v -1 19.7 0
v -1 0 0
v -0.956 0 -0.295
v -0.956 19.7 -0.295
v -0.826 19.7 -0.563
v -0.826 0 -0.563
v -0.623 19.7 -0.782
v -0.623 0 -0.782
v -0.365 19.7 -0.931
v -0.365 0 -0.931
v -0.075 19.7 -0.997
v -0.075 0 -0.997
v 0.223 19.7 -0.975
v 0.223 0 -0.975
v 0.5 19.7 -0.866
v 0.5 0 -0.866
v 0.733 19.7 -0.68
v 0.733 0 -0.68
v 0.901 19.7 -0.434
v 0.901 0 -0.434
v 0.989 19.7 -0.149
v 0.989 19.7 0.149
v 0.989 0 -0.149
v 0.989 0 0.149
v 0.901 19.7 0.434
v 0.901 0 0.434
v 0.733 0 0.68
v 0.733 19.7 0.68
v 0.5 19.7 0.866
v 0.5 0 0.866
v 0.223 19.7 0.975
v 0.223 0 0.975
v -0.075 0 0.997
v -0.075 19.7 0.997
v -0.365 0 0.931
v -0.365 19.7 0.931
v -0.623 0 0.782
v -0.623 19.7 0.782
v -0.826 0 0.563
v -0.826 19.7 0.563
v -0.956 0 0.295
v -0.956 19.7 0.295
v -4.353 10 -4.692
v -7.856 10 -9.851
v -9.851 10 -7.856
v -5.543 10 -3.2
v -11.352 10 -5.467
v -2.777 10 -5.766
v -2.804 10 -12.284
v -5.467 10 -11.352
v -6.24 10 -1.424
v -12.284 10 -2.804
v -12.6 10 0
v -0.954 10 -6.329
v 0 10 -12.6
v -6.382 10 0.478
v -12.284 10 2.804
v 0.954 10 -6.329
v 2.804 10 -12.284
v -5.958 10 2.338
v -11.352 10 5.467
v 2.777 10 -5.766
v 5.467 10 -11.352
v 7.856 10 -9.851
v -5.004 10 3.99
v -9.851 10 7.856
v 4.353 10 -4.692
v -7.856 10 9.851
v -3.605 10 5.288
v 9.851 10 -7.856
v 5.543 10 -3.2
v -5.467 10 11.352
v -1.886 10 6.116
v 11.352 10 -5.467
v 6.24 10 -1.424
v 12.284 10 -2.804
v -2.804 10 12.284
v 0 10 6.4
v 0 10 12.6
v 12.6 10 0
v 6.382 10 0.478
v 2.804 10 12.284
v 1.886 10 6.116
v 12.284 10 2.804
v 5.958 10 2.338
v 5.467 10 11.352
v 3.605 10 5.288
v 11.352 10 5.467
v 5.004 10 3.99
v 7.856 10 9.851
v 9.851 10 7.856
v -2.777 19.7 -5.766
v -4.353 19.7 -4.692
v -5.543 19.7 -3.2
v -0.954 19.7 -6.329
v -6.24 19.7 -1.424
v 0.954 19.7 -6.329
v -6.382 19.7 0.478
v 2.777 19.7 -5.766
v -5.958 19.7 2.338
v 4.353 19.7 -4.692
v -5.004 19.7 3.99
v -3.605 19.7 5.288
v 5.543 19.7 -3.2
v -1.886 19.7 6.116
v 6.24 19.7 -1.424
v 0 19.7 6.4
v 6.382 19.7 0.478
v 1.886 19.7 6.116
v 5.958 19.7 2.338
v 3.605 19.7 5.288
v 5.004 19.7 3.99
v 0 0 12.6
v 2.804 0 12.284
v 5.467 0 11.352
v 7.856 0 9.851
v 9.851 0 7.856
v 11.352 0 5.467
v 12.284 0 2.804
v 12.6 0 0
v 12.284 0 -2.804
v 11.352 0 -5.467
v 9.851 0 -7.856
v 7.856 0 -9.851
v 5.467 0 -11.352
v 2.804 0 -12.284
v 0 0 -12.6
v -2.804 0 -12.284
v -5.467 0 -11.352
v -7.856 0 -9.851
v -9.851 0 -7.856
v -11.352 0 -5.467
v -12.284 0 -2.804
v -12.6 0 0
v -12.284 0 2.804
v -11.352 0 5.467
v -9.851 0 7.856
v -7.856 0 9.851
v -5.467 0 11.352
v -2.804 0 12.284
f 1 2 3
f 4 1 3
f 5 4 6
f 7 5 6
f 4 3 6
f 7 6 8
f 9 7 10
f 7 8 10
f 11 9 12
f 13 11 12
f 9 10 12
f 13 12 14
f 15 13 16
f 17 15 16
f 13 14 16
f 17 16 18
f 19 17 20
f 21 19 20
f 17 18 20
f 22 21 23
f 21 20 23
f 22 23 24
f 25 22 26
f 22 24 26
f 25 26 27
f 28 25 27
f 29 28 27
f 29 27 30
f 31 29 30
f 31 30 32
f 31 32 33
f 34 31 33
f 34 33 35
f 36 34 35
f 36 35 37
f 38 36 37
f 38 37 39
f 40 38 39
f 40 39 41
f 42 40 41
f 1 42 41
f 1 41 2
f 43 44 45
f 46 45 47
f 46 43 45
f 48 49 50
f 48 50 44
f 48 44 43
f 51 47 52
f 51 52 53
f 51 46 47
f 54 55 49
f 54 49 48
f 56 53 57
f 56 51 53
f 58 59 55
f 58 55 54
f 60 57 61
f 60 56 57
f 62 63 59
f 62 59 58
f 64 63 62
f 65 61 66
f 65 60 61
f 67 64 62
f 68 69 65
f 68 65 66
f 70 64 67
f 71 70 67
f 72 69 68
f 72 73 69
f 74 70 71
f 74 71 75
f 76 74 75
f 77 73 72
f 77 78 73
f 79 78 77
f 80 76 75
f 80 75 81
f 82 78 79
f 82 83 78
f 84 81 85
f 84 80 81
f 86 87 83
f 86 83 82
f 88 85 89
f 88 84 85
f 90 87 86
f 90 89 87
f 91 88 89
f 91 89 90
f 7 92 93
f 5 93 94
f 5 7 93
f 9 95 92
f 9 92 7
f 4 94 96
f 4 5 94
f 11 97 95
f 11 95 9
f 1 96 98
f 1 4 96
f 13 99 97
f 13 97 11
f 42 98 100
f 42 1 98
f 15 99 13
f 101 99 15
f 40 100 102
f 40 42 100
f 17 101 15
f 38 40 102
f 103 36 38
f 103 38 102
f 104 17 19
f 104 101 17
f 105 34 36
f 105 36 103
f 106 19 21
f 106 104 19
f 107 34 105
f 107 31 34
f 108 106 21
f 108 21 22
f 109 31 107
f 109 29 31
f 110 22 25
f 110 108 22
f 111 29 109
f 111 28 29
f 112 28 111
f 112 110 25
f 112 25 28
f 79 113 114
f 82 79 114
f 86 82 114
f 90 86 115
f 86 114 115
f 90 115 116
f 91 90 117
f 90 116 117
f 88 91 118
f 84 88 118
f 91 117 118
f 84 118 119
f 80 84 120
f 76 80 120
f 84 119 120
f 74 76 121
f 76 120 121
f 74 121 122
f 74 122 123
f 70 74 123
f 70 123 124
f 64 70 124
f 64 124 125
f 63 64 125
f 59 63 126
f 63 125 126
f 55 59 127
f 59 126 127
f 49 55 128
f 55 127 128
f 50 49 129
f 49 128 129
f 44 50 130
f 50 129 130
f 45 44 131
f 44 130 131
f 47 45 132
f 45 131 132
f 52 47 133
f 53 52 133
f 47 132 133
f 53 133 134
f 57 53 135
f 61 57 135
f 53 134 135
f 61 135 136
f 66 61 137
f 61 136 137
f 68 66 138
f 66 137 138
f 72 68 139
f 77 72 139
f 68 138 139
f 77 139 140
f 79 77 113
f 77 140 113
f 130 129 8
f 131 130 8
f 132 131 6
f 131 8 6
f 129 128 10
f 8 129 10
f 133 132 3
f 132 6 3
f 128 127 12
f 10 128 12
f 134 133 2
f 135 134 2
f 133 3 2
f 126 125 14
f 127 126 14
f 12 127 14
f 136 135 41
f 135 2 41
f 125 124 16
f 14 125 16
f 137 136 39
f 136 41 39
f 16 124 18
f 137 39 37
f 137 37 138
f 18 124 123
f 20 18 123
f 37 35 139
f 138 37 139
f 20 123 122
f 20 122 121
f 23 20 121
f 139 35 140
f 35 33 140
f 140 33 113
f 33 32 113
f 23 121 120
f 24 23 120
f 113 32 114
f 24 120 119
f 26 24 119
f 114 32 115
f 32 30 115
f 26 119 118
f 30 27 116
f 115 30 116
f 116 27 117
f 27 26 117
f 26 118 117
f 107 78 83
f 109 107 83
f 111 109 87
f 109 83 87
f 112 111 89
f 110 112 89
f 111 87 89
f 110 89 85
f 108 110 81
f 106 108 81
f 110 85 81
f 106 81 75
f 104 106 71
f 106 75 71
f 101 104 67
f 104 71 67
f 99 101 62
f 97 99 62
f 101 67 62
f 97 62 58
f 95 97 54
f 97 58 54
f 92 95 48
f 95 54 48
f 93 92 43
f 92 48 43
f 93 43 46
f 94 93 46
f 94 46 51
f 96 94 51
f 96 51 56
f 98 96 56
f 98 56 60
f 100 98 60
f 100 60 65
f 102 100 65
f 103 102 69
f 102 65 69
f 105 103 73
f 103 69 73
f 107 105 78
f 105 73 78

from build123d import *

# Parameters (mm, degrees)
ESQUISSE1_R        = 12.6
BOSS_EXTRU_1_DEPTH = 10
ESQUISSE2_R        = 6.4
BOSS_EXTRU_2_DEPTH = 9.7
D_GAGEMENT_M1_61_D = 2


with BuildPart() as part:
    # Esquisse1 → Boss.-Extru.1 (new body)
    with BuildSketch(Plane(origin=(0, 0, 0), x_dir=(1, 0, 0), z_dir=(0, 1, 0))):
        with Locations(Location((0, 0, 0), (0, 0, 270))):
            Circle(ESQUISSE1_R)
    extrude(amount=BOSS_EXTRU_1_DEPTH)

    # Esquisse2 → Boss.-Extru.2 (add)
    with BuildSketch(Plane(origin=(0, 10, 0), x_dir=(1, 0, 0), z_dir=(0, 1, 0))):
        with Locations(Location((0, 0, 0), (0, 0, 270))):
            Circle(ESQUISSE2_R)
    extrude(amount=BOSS_EXTRU_2_DEPTH)

    # Dégagement M1.61 (through all)
    with Locations(Plane(origin=(0, 19.7, 0), x_dir=(1, 0, 0), z_dir=(0, 1, 0))):
        with Locations((0, 0)):
            Hole(D_GAGEMENT_M1_61_D / 2)


solid = part.part
